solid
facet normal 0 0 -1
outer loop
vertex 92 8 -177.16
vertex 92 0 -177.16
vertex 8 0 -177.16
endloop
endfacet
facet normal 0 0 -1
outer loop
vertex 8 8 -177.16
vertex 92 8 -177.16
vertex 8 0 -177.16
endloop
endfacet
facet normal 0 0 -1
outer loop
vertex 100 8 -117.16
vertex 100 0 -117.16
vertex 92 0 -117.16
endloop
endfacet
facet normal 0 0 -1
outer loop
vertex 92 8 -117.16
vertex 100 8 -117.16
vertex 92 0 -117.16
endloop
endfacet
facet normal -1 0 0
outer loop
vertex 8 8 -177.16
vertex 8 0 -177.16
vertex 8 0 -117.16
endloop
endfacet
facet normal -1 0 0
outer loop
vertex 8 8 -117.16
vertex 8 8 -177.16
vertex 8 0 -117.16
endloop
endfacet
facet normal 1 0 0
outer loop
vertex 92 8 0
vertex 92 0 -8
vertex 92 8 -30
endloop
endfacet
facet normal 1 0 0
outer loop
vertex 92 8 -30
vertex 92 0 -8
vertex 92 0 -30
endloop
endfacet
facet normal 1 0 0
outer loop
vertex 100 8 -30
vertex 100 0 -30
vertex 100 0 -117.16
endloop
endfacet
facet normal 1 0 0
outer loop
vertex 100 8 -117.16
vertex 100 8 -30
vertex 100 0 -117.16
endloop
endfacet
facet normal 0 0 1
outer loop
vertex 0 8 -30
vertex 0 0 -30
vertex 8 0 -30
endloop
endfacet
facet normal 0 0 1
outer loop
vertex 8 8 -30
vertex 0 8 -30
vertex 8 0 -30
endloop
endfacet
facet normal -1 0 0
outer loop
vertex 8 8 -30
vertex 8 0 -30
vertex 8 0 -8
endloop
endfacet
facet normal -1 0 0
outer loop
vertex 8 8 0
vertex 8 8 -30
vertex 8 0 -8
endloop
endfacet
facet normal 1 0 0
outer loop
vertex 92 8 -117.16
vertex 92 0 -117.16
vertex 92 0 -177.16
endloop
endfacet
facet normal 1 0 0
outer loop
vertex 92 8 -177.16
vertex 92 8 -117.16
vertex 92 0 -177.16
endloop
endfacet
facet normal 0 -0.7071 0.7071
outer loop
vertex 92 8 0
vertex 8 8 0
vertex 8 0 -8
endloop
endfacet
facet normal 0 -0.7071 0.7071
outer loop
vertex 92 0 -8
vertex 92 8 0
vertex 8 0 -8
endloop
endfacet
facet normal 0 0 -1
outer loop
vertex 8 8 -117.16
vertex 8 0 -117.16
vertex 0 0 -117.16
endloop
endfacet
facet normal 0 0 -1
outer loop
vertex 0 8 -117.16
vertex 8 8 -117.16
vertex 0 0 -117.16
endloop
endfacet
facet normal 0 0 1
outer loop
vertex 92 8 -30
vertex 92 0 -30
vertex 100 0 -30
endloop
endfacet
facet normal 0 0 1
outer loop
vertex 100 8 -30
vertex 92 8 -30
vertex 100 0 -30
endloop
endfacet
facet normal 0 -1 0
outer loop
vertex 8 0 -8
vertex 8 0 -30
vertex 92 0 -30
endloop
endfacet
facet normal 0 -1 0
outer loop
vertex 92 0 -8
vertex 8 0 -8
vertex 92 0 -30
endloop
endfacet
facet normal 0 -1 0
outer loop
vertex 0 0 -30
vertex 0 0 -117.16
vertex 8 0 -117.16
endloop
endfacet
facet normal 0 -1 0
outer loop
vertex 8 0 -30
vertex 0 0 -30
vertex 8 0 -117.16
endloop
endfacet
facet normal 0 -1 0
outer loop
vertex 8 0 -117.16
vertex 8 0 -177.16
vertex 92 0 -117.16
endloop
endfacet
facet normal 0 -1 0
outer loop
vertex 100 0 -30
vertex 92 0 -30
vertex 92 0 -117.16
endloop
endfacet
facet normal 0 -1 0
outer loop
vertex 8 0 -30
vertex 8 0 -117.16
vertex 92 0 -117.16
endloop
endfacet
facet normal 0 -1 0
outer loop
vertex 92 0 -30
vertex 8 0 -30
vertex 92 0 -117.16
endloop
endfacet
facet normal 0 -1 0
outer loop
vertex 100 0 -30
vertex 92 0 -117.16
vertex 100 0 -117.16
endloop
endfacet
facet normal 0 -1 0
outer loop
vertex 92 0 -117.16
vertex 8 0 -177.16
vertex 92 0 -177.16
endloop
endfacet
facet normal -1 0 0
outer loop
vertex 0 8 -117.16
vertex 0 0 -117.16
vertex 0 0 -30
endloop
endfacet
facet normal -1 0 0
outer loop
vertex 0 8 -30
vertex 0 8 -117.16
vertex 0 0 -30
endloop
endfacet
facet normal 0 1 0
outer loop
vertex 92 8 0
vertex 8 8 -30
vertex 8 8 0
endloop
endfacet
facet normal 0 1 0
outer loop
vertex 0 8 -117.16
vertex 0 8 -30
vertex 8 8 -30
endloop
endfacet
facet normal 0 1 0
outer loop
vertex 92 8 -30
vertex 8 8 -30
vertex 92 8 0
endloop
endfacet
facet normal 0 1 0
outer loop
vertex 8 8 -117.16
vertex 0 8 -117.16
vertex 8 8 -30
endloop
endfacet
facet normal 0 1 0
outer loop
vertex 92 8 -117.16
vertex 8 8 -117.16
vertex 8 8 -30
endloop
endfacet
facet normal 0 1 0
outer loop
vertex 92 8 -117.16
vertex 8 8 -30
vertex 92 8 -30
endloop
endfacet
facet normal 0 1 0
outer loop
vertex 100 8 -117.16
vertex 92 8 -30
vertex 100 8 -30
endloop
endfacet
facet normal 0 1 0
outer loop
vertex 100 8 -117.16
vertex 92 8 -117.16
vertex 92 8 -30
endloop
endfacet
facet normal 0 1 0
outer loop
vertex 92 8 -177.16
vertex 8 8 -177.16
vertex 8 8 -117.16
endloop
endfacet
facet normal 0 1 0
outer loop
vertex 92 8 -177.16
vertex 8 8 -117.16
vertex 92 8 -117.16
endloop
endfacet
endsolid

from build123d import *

# Parameters (mm, degrees)
BOSS_EXTRUDE1_DEPTH = 8
CUT_EXTRUDE1_DEPTH  = 200.784047411


with BuildPart() as part:
    # Sketch1 → Boss-Extrude1 (new body)
    with BuildSketch(Plane(origin=(0, 0, 0), x_dir=(1, 0, 0), z_dir=(0, 1, 0))):
        Polygon((8, 117.16), (0, 117.16), (0, 30), (8, 30), (8, 0), (92, 0), (92, 30), (100, 30), (100, 117.16), (92, 117.16), (92, 177.16), (8, 177.16), align=None)
    extrude(amount=BOSS_EXTRUDE1_DEPTH)

    # Sketch2 → Cut-Extrude1 (cut, through all)
    with BuildSketch(Plane.ZY.offset(-8)):
        Polygon((0, 8), (-8, 0), (0, 0), align=None)
    extrude(amount=-CUT_EXTRUDE1_DEPTH, mode=Mode.SUBTRACT)


solid = part.part
